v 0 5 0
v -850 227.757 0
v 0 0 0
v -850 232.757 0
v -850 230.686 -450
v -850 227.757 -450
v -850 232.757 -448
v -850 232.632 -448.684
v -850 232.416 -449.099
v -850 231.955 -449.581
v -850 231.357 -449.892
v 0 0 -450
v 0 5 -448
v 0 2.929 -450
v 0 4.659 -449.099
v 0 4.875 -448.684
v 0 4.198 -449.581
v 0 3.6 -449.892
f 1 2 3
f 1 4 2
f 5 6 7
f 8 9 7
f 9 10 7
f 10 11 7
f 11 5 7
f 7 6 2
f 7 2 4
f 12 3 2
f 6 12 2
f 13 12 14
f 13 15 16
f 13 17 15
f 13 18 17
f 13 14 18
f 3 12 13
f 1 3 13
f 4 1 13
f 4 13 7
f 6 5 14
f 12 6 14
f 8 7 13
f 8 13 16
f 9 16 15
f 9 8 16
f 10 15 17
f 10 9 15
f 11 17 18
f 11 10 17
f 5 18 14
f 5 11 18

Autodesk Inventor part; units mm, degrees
ref_plane "YZ Plane" through (0, 0, 0) normal (1, 0, 0) x (0, 1, 0)
ref_plane "XZ Plane" through (0, 0, 0) normal (0, 1, 0) x (-1, 0, 0)
ref_plane "XY Plane" through (0, 0, 0) normal (0, 0, 1) x (1, 0, 0)
sketch "스케치1" plane through (0, 0, 0) normal (0, 0, 1) x (1, 0, 0)
  line L0 (0, 0) -> (0, 5)
  line L1 (0, 0) -> (-850, 227.7568)
  line L2 (-12.9463, 0) -> (8.7754, 0)
  line L3 (0, 5) -> (-850, 232.7568)
  line L4 (-850, 227.7568) -> (-850, 232.7568)
  point P0 (-850, 230.2568)
  point P1 (-850, 242.7568)
  point P2 (0, 15)
  dimension "d0" = 15
  dimension "d1" = 5
  dimension "d2" = 850
extrude "돌출1" add sketch "스케치1" against normal blind 450
sketch "스케치3" plane through (0, 15, 0) normal (0.2588, 0.9659, 0) x (0.9659, -0.2588, 0)
  line L0 (-879.9848, 0) -> (-879.9848, 450) projected
  line L1 (3.8823, 0) -> (3.8823, 450) projected
  spline S0 degree 4 poles (-879.9848, 225) (-790.3669, 315.2357) (-705.7025, 105.8229) (-615.8925, 383.2001) (-422.1913, 176.8706) (-352.8385, 360.4529) (-185.1098, 145.8092) (-106.461, 355.2219) (-47.5696, 282.9867) (3.8823, 225) knots 0 0 0 0 0 0.288179 0.401252 0.519809 0.635267 0.741109 1 1 1 1 1
  line L2 (-879.9848, 225) -> (-986.5845, 327.8412)
  line L3 (-986.5845, 327.8412) -> (-911.355, 729.5985)
  line L4 (-911.355, 729.5985) -> (113.0461, 683.1803)
  line L5 (113.0461, 683.1803) -> (3.8823, 225)
  point P0 (-751.2924, 234.868)
  point P1 (-666.4591, 234.868)
  point P2 (-560.8178, 275.0205)
  point P3 (-432.7676, 244.6086)
  point P4 (-339.9313, 291.6979)
  point P5 (-223.0855, 244.6086)
  point P6 (-138.2523, 275.0205)
  point P7 (-77.4285, 291.6979)
extrude "돌출3" [suppressed]
fillet "모깎기4" [suppressed]
fillet "모깎기5" radius 2 1 edges at (-425, 118.8784, -450)
properties part number "부품2" material "에폭시 수지"
